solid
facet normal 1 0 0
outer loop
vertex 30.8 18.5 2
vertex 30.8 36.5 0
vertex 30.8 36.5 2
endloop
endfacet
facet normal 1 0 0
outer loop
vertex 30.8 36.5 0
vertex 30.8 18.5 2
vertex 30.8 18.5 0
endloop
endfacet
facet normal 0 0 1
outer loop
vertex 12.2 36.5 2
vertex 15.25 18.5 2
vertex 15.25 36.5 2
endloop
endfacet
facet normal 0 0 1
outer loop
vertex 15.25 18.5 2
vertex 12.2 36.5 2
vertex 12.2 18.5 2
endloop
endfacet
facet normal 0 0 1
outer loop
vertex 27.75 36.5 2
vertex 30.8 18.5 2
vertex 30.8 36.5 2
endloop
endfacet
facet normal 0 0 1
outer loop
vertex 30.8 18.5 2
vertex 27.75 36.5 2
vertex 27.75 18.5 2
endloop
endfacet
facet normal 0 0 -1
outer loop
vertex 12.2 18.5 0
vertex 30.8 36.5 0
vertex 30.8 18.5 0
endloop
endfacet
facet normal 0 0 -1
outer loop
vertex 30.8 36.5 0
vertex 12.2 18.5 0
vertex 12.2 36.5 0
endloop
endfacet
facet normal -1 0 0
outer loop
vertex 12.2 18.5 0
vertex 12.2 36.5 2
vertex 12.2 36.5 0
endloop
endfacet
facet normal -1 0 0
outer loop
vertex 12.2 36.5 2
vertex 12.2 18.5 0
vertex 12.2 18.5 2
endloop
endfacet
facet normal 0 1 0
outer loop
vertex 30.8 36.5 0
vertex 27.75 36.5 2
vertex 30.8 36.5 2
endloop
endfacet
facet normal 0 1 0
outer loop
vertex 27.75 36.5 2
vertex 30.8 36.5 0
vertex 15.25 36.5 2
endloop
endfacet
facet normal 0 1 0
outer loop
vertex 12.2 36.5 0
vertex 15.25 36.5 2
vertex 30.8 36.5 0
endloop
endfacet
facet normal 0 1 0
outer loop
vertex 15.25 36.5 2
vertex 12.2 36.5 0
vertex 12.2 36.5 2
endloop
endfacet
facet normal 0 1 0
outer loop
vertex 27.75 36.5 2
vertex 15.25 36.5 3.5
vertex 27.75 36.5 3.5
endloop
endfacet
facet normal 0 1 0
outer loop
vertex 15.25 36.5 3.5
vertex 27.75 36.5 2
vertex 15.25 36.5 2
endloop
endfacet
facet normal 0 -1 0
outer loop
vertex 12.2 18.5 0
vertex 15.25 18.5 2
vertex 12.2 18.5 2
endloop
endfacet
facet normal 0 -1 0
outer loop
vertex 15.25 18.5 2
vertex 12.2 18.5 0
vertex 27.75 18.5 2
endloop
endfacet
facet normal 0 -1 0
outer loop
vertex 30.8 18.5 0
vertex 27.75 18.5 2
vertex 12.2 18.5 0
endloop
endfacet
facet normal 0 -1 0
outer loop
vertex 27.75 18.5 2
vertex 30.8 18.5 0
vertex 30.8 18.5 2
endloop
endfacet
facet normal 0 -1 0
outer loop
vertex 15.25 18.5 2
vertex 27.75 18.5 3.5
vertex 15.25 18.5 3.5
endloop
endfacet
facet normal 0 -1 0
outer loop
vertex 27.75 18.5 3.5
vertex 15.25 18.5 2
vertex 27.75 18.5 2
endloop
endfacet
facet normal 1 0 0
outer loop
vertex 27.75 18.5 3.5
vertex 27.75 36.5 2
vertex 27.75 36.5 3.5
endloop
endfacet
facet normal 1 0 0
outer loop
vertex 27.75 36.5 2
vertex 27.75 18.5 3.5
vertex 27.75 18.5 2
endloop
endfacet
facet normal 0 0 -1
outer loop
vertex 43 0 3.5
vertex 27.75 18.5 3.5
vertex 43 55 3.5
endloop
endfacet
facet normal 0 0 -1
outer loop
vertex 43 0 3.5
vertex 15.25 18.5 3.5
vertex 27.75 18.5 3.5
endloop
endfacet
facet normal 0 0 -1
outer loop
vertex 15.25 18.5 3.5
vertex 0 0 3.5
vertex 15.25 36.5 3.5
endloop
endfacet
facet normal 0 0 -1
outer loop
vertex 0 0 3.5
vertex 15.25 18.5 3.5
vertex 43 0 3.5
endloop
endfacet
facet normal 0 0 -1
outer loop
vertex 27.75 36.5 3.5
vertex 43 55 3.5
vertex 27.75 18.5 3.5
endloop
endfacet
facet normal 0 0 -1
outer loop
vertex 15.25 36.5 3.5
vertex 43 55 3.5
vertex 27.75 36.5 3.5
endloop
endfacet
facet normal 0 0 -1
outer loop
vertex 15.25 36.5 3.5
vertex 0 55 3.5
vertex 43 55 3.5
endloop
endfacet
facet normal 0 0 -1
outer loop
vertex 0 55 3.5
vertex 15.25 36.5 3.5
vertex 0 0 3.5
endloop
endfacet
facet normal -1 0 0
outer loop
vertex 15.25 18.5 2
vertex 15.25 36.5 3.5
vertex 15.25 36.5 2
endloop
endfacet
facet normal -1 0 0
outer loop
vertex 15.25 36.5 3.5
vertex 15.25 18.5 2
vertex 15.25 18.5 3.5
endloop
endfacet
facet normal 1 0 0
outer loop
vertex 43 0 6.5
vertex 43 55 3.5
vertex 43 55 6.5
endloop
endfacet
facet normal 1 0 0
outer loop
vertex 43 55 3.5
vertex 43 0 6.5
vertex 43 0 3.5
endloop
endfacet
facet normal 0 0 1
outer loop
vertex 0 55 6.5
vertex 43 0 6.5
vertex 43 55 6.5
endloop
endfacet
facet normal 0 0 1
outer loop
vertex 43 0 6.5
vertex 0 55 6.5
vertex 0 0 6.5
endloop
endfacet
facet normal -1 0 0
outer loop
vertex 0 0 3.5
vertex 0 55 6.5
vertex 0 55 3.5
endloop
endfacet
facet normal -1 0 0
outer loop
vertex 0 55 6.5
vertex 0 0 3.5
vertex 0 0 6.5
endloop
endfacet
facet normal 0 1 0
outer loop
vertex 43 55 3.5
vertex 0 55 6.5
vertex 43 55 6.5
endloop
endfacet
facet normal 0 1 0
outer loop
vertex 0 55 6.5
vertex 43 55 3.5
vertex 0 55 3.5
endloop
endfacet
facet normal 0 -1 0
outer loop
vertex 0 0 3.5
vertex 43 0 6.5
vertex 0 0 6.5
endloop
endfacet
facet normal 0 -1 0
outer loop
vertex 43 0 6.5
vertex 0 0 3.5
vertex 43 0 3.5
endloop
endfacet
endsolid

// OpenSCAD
translate([43 / 2 - 18.6 / 2,55 / 2 - 18 / 2,0]) {
      // per ISO 518:2006(E), page 3 - inner insert
      cube([18.6,18,2]);

    translate([(18.6 - 12.5) / 2,0,2]) {
      // per ISO 518:2006(E), page 3 - between "teeth"
      cube([12.5,18,1.5]);
    }
}


// TODO: experiment with 2mm height
// TODO: is margin =5mm ok?
translate([0,0,1.5 + 2]) {
  cube([38 + 5, 50 + 5,3]);
}

// TODO: color
// TODO: parametrize the calcuations

// TODO: little 1.5mm dip / shelf for placing velcro
// TODO: round corners on the tentacle table

// https://cdn.standards.iteh.ai/samples/36330/0f7a221b5b7647cc972f7403f522191a/ISO-518-2006.pdf
